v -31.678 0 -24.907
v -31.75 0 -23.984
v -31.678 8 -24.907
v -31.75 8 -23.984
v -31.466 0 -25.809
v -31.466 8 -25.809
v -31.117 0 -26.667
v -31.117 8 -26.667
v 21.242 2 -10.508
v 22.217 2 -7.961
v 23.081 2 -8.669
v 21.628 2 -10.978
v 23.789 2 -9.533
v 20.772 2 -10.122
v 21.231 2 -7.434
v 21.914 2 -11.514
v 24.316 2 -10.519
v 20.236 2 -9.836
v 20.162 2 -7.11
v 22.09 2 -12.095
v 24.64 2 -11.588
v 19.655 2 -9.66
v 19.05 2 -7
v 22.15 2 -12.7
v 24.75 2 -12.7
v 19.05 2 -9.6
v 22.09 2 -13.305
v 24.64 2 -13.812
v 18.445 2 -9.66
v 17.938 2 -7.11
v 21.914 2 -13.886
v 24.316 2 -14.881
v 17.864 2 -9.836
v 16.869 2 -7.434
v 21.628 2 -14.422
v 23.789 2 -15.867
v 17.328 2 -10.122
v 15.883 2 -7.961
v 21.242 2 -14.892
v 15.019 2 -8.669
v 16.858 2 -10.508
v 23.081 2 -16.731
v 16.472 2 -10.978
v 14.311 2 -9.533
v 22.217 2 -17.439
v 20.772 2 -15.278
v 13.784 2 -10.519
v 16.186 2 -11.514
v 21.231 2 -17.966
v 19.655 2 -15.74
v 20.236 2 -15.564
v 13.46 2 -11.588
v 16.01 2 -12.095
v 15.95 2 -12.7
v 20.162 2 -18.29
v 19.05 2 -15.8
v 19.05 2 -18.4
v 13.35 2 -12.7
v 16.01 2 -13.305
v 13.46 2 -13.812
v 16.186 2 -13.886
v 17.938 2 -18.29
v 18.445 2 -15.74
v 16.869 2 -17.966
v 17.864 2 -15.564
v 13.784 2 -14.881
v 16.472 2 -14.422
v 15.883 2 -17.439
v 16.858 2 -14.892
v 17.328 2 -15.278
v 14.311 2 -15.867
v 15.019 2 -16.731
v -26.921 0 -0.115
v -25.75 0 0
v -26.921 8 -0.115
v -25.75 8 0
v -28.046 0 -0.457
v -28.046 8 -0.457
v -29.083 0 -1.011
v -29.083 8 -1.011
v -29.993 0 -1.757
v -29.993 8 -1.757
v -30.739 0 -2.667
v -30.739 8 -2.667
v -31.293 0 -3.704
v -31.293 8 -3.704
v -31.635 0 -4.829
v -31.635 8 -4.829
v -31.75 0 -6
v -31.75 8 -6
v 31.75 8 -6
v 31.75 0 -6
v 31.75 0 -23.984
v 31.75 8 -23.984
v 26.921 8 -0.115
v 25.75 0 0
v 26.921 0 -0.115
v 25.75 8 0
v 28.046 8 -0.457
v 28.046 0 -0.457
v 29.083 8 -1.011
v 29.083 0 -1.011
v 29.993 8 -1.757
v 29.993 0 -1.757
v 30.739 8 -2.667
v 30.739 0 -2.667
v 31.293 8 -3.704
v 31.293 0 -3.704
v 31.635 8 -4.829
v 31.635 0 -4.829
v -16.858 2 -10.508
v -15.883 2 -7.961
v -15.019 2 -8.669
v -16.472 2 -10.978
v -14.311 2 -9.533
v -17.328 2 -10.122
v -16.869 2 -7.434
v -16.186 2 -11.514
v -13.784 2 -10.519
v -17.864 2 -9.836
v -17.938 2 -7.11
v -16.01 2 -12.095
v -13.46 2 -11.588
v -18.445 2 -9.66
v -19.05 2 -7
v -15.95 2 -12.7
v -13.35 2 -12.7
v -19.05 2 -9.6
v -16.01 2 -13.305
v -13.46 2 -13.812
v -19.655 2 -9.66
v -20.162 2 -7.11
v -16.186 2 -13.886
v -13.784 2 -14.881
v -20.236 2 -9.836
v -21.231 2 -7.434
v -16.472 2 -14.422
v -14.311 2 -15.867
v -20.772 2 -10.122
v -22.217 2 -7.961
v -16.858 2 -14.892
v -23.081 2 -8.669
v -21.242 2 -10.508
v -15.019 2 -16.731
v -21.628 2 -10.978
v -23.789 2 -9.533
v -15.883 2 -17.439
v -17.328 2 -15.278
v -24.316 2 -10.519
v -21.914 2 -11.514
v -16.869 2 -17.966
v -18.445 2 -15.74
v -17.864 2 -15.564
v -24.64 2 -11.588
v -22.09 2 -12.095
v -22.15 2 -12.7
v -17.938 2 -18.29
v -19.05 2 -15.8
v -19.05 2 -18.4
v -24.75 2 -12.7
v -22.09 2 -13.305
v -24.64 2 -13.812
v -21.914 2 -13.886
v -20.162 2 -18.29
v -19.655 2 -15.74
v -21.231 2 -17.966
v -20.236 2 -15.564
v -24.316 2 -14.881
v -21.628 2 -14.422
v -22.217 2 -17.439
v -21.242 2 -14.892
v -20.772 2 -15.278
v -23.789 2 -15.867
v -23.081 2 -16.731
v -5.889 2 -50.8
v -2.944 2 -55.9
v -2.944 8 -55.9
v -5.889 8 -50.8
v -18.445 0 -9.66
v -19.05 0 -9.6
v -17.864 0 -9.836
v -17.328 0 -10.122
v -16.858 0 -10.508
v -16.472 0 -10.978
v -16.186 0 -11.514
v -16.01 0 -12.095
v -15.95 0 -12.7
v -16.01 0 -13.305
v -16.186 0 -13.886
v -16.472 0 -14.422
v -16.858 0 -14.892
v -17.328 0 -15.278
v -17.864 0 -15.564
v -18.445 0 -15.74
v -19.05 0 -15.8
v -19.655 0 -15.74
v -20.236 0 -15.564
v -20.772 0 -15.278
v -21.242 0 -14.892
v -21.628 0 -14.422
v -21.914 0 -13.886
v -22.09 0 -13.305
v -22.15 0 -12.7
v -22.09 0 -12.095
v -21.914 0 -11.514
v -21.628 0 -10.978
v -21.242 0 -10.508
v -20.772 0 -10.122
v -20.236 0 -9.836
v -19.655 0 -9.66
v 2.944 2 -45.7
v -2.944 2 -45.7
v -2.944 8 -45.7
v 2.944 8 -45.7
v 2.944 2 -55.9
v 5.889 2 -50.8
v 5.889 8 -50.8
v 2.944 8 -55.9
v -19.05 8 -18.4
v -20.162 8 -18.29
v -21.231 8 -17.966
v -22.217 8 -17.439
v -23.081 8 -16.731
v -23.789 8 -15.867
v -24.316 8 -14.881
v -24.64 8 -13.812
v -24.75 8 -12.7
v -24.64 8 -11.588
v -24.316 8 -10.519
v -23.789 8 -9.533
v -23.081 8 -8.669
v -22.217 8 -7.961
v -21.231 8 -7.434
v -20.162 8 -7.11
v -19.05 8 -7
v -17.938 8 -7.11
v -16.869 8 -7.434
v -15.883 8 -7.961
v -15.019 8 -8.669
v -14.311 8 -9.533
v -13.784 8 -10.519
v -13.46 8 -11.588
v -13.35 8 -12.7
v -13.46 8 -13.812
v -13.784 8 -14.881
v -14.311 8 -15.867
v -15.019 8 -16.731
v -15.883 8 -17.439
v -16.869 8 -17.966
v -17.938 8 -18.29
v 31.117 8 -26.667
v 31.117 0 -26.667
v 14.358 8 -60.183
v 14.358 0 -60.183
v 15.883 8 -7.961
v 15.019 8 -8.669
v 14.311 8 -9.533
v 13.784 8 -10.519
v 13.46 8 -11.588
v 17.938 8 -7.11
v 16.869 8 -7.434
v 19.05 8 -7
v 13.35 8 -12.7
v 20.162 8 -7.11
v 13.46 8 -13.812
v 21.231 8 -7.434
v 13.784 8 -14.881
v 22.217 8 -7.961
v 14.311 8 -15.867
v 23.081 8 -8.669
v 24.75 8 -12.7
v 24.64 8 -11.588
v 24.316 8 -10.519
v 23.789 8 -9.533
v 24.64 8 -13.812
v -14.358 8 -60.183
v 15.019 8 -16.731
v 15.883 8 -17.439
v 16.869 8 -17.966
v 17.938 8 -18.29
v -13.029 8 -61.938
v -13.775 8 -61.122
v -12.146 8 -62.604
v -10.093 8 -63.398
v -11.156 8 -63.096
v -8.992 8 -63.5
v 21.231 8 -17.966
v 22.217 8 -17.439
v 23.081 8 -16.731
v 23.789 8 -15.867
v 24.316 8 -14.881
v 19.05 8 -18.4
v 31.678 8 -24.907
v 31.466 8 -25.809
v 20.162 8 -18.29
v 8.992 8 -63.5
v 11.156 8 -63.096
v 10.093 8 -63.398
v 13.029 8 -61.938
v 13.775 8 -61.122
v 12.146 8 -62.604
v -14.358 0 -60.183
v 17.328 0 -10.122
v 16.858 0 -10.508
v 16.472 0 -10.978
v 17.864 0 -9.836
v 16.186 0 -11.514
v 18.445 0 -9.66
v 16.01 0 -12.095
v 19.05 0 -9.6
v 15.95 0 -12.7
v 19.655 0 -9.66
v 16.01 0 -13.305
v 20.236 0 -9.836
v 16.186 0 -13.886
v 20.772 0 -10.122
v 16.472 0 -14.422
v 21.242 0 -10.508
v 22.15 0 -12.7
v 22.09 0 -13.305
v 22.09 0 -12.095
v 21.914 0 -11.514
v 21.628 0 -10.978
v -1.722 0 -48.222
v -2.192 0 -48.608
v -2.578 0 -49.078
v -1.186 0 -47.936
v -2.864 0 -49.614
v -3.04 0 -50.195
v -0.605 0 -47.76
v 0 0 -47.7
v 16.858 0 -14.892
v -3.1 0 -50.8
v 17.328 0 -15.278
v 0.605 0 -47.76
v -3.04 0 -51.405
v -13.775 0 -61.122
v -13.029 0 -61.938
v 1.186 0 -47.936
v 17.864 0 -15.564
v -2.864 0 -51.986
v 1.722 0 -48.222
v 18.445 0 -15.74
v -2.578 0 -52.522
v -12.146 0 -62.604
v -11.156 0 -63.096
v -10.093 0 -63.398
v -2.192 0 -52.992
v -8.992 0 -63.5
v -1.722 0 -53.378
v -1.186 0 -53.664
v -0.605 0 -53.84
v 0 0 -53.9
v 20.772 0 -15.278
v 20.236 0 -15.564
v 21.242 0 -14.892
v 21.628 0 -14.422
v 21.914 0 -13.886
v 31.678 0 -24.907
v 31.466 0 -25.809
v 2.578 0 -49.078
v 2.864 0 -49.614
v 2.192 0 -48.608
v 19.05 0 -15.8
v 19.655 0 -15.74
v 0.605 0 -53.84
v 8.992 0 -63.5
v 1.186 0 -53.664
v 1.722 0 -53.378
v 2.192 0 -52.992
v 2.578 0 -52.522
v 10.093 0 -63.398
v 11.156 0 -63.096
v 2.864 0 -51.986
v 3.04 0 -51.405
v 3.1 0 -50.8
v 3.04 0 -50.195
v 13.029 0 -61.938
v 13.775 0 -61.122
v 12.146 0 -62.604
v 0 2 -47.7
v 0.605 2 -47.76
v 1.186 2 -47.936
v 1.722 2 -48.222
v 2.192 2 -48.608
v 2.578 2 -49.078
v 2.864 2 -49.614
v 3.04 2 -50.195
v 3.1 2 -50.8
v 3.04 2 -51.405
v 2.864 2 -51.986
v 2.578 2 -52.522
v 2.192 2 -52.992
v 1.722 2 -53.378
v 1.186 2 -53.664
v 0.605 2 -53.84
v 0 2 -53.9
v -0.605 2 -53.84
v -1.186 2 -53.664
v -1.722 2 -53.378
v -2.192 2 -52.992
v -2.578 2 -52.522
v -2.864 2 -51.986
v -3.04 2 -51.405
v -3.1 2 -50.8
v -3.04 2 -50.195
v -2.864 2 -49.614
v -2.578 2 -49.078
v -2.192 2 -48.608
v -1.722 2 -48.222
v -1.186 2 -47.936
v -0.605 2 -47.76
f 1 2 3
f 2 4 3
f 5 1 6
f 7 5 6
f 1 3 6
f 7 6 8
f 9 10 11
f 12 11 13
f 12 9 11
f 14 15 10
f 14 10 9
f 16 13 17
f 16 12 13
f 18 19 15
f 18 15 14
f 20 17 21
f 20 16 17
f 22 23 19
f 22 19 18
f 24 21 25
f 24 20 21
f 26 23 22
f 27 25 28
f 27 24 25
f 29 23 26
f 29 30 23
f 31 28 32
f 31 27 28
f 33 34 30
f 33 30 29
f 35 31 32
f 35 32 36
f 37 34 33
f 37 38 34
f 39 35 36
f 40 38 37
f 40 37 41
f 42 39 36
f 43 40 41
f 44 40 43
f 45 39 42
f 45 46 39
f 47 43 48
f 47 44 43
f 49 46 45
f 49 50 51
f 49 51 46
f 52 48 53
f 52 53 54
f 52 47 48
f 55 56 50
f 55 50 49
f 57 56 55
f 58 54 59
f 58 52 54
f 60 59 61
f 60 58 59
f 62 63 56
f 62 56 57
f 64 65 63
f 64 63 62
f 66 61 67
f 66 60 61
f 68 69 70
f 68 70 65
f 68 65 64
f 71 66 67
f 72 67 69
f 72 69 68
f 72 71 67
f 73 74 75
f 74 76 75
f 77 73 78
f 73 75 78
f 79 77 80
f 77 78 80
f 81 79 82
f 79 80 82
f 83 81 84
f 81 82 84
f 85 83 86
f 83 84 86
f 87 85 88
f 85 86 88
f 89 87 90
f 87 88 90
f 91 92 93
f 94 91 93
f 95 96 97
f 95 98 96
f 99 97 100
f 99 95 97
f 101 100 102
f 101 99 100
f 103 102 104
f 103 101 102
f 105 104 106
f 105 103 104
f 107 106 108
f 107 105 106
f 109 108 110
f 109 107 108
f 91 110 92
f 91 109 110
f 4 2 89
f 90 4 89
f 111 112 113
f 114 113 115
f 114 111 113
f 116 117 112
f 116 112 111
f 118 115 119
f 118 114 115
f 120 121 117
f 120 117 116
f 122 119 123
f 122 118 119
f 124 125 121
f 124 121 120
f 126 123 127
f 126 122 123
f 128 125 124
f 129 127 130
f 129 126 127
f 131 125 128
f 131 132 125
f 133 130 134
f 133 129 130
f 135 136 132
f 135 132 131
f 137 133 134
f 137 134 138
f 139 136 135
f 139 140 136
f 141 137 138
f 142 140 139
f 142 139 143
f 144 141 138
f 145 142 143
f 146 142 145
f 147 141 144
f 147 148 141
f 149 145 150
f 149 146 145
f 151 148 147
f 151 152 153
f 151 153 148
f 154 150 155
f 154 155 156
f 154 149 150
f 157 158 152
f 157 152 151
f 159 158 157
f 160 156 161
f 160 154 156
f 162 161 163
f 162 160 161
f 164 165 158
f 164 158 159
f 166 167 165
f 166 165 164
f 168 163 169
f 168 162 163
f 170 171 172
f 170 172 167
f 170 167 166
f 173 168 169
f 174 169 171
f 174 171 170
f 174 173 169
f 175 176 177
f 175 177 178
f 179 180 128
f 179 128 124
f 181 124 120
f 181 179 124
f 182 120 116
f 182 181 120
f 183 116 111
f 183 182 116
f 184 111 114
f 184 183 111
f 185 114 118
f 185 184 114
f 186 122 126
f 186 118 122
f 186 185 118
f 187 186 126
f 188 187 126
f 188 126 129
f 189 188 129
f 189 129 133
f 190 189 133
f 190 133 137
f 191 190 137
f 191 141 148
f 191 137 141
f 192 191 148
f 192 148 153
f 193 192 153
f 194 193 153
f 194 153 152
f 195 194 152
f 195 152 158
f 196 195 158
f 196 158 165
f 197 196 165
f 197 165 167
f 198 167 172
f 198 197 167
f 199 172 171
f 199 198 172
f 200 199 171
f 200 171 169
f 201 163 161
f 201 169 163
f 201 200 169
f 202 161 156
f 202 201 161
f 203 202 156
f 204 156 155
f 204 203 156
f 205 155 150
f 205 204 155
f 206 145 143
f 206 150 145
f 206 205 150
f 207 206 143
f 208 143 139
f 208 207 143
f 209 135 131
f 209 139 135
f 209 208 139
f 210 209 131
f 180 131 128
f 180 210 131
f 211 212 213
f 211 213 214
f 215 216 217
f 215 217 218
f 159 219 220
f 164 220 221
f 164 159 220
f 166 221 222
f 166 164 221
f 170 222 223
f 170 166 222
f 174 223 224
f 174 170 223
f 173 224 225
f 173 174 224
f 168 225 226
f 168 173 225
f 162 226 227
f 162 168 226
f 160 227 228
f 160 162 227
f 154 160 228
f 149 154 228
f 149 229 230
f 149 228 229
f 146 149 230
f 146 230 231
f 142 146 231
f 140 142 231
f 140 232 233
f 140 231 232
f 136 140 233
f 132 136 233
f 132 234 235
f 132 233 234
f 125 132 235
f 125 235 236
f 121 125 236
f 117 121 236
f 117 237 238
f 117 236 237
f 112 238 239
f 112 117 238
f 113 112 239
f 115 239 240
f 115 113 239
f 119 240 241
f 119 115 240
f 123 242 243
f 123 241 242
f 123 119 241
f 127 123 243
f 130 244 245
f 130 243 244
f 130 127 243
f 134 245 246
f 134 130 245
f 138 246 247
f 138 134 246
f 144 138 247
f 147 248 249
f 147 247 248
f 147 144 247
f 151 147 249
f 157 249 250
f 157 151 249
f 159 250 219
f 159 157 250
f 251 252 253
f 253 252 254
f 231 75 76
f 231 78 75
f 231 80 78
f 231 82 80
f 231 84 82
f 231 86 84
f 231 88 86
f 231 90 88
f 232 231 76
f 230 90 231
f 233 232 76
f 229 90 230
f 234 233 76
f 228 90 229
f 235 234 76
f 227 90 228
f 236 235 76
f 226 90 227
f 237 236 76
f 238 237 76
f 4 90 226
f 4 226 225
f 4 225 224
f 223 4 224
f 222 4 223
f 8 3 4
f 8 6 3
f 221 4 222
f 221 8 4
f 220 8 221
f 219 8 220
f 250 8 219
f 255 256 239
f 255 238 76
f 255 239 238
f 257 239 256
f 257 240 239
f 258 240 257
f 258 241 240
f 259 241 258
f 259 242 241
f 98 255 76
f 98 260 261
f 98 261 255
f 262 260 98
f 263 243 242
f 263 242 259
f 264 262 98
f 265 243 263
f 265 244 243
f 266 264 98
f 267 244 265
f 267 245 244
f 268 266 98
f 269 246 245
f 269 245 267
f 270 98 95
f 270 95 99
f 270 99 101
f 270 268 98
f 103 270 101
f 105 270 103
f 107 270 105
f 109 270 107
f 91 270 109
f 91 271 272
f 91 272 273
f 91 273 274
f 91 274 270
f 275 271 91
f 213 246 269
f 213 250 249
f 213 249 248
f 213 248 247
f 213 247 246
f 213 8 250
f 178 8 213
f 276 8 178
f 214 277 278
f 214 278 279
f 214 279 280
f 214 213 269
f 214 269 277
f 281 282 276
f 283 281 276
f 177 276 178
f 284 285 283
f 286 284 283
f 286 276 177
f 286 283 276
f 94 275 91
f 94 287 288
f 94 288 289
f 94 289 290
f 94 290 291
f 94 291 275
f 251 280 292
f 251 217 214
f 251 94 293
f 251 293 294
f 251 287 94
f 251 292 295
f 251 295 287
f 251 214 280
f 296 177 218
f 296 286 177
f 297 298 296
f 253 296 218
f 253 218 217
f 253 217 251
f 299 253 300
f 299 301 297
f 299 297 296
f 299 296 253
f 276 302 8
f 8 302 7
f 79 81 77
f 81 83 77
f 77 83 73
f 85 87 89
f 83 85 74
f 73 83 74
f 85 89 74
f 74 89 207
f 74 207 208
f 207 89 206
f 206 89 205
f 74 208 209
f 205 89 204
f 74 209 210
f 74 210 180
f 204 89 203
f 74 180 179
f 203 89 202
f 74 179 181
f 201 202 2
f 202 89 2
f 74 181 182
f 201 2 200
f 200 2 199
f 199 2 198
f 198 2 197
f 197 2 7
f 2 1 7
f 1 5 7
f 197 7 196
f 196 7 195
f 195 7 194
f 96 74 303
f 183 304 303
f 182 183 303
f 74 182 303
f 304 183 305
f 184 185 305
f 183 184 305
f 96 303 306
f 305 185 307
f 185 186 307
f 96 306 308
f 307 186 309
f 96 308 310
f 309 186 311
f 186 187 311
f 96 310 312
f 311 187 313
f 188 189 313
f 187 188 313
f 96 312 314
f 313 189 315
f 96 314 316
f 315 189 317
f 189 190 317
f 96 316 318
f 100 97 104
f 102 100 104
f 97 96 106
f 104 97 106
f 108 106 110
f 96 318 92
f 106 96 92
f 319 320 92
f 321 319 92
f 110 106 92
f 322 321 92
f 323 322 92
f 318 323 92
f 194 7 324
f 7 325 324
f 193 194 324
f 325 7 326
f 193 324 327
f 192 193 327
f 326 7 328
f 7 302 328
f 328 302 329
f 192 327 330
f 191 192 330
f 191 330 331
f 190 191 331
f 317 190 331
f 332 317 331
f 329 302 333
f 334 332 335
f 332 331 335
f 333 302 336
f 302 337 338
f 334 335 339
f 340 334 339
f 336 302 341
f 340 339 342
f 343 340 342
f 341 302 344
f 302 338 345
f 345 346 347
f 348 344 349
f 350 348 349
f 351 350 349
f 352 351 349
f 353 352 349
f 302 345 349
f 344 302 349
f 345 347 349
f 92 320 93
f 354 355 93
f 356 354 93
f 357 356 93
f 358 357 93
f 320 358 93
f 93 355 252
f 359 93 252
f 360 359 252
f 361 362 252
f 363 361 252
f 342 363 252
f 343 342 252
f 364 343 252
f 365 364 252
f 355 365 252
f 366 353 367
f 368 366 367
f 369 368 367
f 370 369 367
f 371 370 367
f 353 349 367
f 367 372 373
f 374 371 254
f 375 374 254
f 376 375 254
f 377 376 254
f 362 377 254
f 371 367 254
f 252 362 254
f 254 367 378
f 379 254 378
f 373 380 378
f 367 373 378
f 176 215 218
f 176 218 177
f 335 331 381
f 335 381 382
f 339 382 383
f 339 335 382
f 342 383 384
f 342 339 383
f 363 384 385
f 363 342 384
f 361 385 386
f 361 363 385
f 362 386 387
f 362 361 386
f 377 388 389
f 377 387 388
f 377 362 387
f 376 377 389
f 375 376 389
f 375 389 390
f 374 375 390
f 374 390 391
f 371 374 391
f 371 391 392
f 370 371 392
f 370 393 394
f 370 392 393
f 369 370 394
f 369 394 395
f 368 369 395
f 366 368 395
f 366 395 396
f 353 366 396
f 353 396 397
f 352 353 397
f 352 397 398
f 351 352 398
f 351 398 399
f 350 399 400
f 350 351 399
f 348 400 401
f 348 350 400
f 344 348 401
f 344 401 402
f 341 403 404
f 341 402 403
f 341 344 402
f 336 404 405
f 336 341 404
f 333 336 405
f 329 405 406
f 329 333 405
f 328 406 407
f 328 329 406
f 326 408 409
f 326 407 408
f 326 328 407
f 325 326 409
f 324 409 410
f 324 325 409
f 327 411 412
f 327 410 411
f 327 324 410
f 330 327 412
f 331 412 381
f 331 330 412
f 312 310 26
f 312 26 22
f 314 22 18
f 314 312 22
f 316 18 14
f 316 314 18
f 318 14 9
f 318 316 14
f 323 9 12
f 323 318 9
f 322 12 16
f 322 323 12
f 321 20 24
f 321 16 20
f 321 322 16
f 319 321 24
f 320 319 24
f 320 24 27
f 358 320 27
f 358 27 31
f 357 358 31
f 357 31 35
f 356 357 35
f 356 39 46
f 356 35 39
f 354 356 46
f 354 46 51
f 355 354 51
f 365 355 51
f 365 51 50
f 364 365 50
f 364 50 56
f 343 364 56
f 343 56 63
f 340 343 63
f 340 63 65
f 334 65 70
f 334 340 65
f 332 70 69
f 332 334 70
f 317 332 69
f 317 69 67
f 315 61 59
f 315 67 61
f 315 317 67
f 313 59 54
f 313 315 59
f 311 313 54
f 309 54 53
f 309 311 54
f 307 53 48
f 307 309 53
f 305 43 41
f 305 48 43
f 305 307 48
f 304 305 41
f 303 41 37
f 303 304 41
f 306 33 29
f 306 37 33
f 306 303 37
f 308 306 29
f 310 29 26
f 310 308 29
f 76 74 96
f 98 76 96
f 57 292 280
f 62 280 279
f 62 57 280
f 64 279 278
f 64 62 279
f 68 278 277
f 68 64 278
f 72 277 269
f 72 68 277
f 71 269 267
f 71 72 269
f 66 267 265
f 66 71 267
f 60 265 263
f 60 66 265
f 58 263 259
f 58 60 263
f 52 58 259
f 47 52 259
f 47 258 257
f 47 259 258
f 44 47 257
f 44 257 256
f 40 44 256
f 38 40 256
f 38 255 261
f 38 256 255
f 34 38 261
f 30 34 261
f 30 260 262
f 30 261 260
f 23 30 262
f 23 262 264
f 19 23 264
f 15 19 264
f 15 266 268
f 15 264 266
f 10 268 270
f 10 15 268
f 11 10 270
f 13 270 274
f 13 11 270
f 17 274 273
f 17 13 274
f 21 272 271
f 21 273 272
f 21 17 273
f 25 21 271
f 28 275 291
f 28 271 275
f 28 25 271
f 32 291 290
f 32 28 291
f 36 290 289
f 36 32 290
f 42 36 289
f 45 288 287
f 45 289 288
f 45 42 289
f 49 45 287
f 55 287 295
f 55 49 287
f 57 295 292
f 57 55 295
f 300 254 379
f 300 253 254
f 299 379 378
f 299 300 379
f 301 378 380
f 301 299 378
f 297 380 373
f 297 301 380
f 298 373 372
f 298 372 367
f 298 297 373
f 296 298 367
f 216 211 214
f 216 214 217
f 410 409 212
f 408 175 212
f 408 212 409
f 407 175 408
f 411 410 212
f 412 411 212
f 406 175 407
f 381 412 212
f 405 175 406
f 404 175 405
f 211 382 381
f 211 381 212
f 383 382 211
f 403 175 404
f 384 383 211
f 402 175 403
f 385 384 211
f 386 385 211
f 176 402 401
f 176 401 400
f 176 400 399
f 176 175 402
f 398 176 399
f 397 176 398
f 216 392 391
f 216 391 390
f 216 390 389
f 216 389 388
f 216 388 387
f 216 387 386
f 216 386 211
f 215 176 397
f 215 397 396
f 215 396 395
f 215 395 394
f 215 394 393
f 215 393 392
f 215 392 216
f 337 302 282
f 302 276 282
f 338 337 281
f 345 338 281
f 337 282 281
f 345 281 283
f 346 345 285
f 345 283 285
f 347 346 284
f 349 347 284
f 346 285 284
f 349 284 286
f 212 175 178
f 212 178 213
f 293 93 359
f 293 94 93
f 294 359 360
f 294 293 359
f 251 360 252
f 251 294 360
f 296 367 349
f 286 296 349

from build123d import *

# Parameters (mm, degrees)
BOSS_EXTRUDE1_DEPTH     = 8
CUT_EXTRUDE1_DEPTH      = 72.444471445
CUT_EXTRUDE1_DEPTH_BACK = 72.444471445
SKETCH2_R               = 3.1
FILLET1_R               = 6
CUT_EXTRUDE2_DEPTH      = 72.444471445
CUT_EXTRUDE2_DEPTH_BACK = 6
SKETCH3_R               = 5.7


with BuildPart() as part:
    # Sketch1 → Boss-Extrude1 (new body)
    with BuildSketch(Plane(origin=(0, 0, 0), x_dir=(1, 0, 0), z_dir=(0, 1, 0))):
        Polygon((-31.75, 0), (31.75, 0), (31.75, 25.4), (12.7, 63.5), (-12.7, 63.5), (-31.75, 25.4), align=None)
    extrude(amount=BOSS_EXTRUDE1_DEPTH)

    # Sketch2 → Cut-Extrude1 (cut, two sides: drawn at the far end of the back side and taken through both)
    with BuildSketch(Plane(origin=(0, 8, 0), x_dir=(1, 0, 0), z_dir=(0, 1, 0)).offset(-CUT_EXTRUDE1_DEPTH_BACK)):
        with Locations(Location((0, 50.8, 0), (0, 0, 270))):
            Circle(SKETCH2_R)
        with Locations(Location((-19.05, 12.7, 0), (0, 0, 270))):
            Circle(SKETCH2_R)
        with Locations(Location((19.05, 12.7, 0), (0, 0, 270))):
            Circle(SKETCH2_R)
    extrude(amount=CUT_EXTRUDE1_DEPTH + CUT_EXTRUDE1_DEPTH_BACK, mode=Mode.SUBTRACT)

    # Fillet1
    fillet1_edges = [part.edges().sort_by_distance(p)[0] for p in [
        (31.75, 4, 0),
        (-31.75, 4, 0),
        (-31.75, 4, -25.4),
        (-12.7, 4, -63.5),
        (12.7, 4, -63.5),
        (31.75, 4, -25.4),
    ]]
    fillet(fillet1_edges, radius=FILLET1_R)

    # Sketch3 → Cut-Extrude2 (cut, two sides: drawn at the far end of the back side and taken through both)
    with BuildSketch(Plane(origin=(0, 8, 0), x_dir=(1, 0, 0), z_dir=(0, 1, 0)).offset(-CUT_EXTRUDE2_DEPTH_BACK)):
        with Locations(Location((-19.05, 12.7, 0), (0, 0, 90))):
            Circle(SKETCH3_R)
        with Locations(Location((19.05, 12.7, 0), (0, 0, 90))):
            Circle(SKETCH3_R)
        Polygon((5.888972746, 50.8), (2.944486373, 55.9), (-2.944486373, 55.9), (-5.888972746, 50.8), (-2.944486373, 45.7), (2.944486373, 45.7), align=None)
    extrude(amount=CUT_EXTRUDE2_DEPTH + CUT_EXTRUDE2_DEPTH_BACK, mode=Mode.SUBTRACT)


solid = part.part
